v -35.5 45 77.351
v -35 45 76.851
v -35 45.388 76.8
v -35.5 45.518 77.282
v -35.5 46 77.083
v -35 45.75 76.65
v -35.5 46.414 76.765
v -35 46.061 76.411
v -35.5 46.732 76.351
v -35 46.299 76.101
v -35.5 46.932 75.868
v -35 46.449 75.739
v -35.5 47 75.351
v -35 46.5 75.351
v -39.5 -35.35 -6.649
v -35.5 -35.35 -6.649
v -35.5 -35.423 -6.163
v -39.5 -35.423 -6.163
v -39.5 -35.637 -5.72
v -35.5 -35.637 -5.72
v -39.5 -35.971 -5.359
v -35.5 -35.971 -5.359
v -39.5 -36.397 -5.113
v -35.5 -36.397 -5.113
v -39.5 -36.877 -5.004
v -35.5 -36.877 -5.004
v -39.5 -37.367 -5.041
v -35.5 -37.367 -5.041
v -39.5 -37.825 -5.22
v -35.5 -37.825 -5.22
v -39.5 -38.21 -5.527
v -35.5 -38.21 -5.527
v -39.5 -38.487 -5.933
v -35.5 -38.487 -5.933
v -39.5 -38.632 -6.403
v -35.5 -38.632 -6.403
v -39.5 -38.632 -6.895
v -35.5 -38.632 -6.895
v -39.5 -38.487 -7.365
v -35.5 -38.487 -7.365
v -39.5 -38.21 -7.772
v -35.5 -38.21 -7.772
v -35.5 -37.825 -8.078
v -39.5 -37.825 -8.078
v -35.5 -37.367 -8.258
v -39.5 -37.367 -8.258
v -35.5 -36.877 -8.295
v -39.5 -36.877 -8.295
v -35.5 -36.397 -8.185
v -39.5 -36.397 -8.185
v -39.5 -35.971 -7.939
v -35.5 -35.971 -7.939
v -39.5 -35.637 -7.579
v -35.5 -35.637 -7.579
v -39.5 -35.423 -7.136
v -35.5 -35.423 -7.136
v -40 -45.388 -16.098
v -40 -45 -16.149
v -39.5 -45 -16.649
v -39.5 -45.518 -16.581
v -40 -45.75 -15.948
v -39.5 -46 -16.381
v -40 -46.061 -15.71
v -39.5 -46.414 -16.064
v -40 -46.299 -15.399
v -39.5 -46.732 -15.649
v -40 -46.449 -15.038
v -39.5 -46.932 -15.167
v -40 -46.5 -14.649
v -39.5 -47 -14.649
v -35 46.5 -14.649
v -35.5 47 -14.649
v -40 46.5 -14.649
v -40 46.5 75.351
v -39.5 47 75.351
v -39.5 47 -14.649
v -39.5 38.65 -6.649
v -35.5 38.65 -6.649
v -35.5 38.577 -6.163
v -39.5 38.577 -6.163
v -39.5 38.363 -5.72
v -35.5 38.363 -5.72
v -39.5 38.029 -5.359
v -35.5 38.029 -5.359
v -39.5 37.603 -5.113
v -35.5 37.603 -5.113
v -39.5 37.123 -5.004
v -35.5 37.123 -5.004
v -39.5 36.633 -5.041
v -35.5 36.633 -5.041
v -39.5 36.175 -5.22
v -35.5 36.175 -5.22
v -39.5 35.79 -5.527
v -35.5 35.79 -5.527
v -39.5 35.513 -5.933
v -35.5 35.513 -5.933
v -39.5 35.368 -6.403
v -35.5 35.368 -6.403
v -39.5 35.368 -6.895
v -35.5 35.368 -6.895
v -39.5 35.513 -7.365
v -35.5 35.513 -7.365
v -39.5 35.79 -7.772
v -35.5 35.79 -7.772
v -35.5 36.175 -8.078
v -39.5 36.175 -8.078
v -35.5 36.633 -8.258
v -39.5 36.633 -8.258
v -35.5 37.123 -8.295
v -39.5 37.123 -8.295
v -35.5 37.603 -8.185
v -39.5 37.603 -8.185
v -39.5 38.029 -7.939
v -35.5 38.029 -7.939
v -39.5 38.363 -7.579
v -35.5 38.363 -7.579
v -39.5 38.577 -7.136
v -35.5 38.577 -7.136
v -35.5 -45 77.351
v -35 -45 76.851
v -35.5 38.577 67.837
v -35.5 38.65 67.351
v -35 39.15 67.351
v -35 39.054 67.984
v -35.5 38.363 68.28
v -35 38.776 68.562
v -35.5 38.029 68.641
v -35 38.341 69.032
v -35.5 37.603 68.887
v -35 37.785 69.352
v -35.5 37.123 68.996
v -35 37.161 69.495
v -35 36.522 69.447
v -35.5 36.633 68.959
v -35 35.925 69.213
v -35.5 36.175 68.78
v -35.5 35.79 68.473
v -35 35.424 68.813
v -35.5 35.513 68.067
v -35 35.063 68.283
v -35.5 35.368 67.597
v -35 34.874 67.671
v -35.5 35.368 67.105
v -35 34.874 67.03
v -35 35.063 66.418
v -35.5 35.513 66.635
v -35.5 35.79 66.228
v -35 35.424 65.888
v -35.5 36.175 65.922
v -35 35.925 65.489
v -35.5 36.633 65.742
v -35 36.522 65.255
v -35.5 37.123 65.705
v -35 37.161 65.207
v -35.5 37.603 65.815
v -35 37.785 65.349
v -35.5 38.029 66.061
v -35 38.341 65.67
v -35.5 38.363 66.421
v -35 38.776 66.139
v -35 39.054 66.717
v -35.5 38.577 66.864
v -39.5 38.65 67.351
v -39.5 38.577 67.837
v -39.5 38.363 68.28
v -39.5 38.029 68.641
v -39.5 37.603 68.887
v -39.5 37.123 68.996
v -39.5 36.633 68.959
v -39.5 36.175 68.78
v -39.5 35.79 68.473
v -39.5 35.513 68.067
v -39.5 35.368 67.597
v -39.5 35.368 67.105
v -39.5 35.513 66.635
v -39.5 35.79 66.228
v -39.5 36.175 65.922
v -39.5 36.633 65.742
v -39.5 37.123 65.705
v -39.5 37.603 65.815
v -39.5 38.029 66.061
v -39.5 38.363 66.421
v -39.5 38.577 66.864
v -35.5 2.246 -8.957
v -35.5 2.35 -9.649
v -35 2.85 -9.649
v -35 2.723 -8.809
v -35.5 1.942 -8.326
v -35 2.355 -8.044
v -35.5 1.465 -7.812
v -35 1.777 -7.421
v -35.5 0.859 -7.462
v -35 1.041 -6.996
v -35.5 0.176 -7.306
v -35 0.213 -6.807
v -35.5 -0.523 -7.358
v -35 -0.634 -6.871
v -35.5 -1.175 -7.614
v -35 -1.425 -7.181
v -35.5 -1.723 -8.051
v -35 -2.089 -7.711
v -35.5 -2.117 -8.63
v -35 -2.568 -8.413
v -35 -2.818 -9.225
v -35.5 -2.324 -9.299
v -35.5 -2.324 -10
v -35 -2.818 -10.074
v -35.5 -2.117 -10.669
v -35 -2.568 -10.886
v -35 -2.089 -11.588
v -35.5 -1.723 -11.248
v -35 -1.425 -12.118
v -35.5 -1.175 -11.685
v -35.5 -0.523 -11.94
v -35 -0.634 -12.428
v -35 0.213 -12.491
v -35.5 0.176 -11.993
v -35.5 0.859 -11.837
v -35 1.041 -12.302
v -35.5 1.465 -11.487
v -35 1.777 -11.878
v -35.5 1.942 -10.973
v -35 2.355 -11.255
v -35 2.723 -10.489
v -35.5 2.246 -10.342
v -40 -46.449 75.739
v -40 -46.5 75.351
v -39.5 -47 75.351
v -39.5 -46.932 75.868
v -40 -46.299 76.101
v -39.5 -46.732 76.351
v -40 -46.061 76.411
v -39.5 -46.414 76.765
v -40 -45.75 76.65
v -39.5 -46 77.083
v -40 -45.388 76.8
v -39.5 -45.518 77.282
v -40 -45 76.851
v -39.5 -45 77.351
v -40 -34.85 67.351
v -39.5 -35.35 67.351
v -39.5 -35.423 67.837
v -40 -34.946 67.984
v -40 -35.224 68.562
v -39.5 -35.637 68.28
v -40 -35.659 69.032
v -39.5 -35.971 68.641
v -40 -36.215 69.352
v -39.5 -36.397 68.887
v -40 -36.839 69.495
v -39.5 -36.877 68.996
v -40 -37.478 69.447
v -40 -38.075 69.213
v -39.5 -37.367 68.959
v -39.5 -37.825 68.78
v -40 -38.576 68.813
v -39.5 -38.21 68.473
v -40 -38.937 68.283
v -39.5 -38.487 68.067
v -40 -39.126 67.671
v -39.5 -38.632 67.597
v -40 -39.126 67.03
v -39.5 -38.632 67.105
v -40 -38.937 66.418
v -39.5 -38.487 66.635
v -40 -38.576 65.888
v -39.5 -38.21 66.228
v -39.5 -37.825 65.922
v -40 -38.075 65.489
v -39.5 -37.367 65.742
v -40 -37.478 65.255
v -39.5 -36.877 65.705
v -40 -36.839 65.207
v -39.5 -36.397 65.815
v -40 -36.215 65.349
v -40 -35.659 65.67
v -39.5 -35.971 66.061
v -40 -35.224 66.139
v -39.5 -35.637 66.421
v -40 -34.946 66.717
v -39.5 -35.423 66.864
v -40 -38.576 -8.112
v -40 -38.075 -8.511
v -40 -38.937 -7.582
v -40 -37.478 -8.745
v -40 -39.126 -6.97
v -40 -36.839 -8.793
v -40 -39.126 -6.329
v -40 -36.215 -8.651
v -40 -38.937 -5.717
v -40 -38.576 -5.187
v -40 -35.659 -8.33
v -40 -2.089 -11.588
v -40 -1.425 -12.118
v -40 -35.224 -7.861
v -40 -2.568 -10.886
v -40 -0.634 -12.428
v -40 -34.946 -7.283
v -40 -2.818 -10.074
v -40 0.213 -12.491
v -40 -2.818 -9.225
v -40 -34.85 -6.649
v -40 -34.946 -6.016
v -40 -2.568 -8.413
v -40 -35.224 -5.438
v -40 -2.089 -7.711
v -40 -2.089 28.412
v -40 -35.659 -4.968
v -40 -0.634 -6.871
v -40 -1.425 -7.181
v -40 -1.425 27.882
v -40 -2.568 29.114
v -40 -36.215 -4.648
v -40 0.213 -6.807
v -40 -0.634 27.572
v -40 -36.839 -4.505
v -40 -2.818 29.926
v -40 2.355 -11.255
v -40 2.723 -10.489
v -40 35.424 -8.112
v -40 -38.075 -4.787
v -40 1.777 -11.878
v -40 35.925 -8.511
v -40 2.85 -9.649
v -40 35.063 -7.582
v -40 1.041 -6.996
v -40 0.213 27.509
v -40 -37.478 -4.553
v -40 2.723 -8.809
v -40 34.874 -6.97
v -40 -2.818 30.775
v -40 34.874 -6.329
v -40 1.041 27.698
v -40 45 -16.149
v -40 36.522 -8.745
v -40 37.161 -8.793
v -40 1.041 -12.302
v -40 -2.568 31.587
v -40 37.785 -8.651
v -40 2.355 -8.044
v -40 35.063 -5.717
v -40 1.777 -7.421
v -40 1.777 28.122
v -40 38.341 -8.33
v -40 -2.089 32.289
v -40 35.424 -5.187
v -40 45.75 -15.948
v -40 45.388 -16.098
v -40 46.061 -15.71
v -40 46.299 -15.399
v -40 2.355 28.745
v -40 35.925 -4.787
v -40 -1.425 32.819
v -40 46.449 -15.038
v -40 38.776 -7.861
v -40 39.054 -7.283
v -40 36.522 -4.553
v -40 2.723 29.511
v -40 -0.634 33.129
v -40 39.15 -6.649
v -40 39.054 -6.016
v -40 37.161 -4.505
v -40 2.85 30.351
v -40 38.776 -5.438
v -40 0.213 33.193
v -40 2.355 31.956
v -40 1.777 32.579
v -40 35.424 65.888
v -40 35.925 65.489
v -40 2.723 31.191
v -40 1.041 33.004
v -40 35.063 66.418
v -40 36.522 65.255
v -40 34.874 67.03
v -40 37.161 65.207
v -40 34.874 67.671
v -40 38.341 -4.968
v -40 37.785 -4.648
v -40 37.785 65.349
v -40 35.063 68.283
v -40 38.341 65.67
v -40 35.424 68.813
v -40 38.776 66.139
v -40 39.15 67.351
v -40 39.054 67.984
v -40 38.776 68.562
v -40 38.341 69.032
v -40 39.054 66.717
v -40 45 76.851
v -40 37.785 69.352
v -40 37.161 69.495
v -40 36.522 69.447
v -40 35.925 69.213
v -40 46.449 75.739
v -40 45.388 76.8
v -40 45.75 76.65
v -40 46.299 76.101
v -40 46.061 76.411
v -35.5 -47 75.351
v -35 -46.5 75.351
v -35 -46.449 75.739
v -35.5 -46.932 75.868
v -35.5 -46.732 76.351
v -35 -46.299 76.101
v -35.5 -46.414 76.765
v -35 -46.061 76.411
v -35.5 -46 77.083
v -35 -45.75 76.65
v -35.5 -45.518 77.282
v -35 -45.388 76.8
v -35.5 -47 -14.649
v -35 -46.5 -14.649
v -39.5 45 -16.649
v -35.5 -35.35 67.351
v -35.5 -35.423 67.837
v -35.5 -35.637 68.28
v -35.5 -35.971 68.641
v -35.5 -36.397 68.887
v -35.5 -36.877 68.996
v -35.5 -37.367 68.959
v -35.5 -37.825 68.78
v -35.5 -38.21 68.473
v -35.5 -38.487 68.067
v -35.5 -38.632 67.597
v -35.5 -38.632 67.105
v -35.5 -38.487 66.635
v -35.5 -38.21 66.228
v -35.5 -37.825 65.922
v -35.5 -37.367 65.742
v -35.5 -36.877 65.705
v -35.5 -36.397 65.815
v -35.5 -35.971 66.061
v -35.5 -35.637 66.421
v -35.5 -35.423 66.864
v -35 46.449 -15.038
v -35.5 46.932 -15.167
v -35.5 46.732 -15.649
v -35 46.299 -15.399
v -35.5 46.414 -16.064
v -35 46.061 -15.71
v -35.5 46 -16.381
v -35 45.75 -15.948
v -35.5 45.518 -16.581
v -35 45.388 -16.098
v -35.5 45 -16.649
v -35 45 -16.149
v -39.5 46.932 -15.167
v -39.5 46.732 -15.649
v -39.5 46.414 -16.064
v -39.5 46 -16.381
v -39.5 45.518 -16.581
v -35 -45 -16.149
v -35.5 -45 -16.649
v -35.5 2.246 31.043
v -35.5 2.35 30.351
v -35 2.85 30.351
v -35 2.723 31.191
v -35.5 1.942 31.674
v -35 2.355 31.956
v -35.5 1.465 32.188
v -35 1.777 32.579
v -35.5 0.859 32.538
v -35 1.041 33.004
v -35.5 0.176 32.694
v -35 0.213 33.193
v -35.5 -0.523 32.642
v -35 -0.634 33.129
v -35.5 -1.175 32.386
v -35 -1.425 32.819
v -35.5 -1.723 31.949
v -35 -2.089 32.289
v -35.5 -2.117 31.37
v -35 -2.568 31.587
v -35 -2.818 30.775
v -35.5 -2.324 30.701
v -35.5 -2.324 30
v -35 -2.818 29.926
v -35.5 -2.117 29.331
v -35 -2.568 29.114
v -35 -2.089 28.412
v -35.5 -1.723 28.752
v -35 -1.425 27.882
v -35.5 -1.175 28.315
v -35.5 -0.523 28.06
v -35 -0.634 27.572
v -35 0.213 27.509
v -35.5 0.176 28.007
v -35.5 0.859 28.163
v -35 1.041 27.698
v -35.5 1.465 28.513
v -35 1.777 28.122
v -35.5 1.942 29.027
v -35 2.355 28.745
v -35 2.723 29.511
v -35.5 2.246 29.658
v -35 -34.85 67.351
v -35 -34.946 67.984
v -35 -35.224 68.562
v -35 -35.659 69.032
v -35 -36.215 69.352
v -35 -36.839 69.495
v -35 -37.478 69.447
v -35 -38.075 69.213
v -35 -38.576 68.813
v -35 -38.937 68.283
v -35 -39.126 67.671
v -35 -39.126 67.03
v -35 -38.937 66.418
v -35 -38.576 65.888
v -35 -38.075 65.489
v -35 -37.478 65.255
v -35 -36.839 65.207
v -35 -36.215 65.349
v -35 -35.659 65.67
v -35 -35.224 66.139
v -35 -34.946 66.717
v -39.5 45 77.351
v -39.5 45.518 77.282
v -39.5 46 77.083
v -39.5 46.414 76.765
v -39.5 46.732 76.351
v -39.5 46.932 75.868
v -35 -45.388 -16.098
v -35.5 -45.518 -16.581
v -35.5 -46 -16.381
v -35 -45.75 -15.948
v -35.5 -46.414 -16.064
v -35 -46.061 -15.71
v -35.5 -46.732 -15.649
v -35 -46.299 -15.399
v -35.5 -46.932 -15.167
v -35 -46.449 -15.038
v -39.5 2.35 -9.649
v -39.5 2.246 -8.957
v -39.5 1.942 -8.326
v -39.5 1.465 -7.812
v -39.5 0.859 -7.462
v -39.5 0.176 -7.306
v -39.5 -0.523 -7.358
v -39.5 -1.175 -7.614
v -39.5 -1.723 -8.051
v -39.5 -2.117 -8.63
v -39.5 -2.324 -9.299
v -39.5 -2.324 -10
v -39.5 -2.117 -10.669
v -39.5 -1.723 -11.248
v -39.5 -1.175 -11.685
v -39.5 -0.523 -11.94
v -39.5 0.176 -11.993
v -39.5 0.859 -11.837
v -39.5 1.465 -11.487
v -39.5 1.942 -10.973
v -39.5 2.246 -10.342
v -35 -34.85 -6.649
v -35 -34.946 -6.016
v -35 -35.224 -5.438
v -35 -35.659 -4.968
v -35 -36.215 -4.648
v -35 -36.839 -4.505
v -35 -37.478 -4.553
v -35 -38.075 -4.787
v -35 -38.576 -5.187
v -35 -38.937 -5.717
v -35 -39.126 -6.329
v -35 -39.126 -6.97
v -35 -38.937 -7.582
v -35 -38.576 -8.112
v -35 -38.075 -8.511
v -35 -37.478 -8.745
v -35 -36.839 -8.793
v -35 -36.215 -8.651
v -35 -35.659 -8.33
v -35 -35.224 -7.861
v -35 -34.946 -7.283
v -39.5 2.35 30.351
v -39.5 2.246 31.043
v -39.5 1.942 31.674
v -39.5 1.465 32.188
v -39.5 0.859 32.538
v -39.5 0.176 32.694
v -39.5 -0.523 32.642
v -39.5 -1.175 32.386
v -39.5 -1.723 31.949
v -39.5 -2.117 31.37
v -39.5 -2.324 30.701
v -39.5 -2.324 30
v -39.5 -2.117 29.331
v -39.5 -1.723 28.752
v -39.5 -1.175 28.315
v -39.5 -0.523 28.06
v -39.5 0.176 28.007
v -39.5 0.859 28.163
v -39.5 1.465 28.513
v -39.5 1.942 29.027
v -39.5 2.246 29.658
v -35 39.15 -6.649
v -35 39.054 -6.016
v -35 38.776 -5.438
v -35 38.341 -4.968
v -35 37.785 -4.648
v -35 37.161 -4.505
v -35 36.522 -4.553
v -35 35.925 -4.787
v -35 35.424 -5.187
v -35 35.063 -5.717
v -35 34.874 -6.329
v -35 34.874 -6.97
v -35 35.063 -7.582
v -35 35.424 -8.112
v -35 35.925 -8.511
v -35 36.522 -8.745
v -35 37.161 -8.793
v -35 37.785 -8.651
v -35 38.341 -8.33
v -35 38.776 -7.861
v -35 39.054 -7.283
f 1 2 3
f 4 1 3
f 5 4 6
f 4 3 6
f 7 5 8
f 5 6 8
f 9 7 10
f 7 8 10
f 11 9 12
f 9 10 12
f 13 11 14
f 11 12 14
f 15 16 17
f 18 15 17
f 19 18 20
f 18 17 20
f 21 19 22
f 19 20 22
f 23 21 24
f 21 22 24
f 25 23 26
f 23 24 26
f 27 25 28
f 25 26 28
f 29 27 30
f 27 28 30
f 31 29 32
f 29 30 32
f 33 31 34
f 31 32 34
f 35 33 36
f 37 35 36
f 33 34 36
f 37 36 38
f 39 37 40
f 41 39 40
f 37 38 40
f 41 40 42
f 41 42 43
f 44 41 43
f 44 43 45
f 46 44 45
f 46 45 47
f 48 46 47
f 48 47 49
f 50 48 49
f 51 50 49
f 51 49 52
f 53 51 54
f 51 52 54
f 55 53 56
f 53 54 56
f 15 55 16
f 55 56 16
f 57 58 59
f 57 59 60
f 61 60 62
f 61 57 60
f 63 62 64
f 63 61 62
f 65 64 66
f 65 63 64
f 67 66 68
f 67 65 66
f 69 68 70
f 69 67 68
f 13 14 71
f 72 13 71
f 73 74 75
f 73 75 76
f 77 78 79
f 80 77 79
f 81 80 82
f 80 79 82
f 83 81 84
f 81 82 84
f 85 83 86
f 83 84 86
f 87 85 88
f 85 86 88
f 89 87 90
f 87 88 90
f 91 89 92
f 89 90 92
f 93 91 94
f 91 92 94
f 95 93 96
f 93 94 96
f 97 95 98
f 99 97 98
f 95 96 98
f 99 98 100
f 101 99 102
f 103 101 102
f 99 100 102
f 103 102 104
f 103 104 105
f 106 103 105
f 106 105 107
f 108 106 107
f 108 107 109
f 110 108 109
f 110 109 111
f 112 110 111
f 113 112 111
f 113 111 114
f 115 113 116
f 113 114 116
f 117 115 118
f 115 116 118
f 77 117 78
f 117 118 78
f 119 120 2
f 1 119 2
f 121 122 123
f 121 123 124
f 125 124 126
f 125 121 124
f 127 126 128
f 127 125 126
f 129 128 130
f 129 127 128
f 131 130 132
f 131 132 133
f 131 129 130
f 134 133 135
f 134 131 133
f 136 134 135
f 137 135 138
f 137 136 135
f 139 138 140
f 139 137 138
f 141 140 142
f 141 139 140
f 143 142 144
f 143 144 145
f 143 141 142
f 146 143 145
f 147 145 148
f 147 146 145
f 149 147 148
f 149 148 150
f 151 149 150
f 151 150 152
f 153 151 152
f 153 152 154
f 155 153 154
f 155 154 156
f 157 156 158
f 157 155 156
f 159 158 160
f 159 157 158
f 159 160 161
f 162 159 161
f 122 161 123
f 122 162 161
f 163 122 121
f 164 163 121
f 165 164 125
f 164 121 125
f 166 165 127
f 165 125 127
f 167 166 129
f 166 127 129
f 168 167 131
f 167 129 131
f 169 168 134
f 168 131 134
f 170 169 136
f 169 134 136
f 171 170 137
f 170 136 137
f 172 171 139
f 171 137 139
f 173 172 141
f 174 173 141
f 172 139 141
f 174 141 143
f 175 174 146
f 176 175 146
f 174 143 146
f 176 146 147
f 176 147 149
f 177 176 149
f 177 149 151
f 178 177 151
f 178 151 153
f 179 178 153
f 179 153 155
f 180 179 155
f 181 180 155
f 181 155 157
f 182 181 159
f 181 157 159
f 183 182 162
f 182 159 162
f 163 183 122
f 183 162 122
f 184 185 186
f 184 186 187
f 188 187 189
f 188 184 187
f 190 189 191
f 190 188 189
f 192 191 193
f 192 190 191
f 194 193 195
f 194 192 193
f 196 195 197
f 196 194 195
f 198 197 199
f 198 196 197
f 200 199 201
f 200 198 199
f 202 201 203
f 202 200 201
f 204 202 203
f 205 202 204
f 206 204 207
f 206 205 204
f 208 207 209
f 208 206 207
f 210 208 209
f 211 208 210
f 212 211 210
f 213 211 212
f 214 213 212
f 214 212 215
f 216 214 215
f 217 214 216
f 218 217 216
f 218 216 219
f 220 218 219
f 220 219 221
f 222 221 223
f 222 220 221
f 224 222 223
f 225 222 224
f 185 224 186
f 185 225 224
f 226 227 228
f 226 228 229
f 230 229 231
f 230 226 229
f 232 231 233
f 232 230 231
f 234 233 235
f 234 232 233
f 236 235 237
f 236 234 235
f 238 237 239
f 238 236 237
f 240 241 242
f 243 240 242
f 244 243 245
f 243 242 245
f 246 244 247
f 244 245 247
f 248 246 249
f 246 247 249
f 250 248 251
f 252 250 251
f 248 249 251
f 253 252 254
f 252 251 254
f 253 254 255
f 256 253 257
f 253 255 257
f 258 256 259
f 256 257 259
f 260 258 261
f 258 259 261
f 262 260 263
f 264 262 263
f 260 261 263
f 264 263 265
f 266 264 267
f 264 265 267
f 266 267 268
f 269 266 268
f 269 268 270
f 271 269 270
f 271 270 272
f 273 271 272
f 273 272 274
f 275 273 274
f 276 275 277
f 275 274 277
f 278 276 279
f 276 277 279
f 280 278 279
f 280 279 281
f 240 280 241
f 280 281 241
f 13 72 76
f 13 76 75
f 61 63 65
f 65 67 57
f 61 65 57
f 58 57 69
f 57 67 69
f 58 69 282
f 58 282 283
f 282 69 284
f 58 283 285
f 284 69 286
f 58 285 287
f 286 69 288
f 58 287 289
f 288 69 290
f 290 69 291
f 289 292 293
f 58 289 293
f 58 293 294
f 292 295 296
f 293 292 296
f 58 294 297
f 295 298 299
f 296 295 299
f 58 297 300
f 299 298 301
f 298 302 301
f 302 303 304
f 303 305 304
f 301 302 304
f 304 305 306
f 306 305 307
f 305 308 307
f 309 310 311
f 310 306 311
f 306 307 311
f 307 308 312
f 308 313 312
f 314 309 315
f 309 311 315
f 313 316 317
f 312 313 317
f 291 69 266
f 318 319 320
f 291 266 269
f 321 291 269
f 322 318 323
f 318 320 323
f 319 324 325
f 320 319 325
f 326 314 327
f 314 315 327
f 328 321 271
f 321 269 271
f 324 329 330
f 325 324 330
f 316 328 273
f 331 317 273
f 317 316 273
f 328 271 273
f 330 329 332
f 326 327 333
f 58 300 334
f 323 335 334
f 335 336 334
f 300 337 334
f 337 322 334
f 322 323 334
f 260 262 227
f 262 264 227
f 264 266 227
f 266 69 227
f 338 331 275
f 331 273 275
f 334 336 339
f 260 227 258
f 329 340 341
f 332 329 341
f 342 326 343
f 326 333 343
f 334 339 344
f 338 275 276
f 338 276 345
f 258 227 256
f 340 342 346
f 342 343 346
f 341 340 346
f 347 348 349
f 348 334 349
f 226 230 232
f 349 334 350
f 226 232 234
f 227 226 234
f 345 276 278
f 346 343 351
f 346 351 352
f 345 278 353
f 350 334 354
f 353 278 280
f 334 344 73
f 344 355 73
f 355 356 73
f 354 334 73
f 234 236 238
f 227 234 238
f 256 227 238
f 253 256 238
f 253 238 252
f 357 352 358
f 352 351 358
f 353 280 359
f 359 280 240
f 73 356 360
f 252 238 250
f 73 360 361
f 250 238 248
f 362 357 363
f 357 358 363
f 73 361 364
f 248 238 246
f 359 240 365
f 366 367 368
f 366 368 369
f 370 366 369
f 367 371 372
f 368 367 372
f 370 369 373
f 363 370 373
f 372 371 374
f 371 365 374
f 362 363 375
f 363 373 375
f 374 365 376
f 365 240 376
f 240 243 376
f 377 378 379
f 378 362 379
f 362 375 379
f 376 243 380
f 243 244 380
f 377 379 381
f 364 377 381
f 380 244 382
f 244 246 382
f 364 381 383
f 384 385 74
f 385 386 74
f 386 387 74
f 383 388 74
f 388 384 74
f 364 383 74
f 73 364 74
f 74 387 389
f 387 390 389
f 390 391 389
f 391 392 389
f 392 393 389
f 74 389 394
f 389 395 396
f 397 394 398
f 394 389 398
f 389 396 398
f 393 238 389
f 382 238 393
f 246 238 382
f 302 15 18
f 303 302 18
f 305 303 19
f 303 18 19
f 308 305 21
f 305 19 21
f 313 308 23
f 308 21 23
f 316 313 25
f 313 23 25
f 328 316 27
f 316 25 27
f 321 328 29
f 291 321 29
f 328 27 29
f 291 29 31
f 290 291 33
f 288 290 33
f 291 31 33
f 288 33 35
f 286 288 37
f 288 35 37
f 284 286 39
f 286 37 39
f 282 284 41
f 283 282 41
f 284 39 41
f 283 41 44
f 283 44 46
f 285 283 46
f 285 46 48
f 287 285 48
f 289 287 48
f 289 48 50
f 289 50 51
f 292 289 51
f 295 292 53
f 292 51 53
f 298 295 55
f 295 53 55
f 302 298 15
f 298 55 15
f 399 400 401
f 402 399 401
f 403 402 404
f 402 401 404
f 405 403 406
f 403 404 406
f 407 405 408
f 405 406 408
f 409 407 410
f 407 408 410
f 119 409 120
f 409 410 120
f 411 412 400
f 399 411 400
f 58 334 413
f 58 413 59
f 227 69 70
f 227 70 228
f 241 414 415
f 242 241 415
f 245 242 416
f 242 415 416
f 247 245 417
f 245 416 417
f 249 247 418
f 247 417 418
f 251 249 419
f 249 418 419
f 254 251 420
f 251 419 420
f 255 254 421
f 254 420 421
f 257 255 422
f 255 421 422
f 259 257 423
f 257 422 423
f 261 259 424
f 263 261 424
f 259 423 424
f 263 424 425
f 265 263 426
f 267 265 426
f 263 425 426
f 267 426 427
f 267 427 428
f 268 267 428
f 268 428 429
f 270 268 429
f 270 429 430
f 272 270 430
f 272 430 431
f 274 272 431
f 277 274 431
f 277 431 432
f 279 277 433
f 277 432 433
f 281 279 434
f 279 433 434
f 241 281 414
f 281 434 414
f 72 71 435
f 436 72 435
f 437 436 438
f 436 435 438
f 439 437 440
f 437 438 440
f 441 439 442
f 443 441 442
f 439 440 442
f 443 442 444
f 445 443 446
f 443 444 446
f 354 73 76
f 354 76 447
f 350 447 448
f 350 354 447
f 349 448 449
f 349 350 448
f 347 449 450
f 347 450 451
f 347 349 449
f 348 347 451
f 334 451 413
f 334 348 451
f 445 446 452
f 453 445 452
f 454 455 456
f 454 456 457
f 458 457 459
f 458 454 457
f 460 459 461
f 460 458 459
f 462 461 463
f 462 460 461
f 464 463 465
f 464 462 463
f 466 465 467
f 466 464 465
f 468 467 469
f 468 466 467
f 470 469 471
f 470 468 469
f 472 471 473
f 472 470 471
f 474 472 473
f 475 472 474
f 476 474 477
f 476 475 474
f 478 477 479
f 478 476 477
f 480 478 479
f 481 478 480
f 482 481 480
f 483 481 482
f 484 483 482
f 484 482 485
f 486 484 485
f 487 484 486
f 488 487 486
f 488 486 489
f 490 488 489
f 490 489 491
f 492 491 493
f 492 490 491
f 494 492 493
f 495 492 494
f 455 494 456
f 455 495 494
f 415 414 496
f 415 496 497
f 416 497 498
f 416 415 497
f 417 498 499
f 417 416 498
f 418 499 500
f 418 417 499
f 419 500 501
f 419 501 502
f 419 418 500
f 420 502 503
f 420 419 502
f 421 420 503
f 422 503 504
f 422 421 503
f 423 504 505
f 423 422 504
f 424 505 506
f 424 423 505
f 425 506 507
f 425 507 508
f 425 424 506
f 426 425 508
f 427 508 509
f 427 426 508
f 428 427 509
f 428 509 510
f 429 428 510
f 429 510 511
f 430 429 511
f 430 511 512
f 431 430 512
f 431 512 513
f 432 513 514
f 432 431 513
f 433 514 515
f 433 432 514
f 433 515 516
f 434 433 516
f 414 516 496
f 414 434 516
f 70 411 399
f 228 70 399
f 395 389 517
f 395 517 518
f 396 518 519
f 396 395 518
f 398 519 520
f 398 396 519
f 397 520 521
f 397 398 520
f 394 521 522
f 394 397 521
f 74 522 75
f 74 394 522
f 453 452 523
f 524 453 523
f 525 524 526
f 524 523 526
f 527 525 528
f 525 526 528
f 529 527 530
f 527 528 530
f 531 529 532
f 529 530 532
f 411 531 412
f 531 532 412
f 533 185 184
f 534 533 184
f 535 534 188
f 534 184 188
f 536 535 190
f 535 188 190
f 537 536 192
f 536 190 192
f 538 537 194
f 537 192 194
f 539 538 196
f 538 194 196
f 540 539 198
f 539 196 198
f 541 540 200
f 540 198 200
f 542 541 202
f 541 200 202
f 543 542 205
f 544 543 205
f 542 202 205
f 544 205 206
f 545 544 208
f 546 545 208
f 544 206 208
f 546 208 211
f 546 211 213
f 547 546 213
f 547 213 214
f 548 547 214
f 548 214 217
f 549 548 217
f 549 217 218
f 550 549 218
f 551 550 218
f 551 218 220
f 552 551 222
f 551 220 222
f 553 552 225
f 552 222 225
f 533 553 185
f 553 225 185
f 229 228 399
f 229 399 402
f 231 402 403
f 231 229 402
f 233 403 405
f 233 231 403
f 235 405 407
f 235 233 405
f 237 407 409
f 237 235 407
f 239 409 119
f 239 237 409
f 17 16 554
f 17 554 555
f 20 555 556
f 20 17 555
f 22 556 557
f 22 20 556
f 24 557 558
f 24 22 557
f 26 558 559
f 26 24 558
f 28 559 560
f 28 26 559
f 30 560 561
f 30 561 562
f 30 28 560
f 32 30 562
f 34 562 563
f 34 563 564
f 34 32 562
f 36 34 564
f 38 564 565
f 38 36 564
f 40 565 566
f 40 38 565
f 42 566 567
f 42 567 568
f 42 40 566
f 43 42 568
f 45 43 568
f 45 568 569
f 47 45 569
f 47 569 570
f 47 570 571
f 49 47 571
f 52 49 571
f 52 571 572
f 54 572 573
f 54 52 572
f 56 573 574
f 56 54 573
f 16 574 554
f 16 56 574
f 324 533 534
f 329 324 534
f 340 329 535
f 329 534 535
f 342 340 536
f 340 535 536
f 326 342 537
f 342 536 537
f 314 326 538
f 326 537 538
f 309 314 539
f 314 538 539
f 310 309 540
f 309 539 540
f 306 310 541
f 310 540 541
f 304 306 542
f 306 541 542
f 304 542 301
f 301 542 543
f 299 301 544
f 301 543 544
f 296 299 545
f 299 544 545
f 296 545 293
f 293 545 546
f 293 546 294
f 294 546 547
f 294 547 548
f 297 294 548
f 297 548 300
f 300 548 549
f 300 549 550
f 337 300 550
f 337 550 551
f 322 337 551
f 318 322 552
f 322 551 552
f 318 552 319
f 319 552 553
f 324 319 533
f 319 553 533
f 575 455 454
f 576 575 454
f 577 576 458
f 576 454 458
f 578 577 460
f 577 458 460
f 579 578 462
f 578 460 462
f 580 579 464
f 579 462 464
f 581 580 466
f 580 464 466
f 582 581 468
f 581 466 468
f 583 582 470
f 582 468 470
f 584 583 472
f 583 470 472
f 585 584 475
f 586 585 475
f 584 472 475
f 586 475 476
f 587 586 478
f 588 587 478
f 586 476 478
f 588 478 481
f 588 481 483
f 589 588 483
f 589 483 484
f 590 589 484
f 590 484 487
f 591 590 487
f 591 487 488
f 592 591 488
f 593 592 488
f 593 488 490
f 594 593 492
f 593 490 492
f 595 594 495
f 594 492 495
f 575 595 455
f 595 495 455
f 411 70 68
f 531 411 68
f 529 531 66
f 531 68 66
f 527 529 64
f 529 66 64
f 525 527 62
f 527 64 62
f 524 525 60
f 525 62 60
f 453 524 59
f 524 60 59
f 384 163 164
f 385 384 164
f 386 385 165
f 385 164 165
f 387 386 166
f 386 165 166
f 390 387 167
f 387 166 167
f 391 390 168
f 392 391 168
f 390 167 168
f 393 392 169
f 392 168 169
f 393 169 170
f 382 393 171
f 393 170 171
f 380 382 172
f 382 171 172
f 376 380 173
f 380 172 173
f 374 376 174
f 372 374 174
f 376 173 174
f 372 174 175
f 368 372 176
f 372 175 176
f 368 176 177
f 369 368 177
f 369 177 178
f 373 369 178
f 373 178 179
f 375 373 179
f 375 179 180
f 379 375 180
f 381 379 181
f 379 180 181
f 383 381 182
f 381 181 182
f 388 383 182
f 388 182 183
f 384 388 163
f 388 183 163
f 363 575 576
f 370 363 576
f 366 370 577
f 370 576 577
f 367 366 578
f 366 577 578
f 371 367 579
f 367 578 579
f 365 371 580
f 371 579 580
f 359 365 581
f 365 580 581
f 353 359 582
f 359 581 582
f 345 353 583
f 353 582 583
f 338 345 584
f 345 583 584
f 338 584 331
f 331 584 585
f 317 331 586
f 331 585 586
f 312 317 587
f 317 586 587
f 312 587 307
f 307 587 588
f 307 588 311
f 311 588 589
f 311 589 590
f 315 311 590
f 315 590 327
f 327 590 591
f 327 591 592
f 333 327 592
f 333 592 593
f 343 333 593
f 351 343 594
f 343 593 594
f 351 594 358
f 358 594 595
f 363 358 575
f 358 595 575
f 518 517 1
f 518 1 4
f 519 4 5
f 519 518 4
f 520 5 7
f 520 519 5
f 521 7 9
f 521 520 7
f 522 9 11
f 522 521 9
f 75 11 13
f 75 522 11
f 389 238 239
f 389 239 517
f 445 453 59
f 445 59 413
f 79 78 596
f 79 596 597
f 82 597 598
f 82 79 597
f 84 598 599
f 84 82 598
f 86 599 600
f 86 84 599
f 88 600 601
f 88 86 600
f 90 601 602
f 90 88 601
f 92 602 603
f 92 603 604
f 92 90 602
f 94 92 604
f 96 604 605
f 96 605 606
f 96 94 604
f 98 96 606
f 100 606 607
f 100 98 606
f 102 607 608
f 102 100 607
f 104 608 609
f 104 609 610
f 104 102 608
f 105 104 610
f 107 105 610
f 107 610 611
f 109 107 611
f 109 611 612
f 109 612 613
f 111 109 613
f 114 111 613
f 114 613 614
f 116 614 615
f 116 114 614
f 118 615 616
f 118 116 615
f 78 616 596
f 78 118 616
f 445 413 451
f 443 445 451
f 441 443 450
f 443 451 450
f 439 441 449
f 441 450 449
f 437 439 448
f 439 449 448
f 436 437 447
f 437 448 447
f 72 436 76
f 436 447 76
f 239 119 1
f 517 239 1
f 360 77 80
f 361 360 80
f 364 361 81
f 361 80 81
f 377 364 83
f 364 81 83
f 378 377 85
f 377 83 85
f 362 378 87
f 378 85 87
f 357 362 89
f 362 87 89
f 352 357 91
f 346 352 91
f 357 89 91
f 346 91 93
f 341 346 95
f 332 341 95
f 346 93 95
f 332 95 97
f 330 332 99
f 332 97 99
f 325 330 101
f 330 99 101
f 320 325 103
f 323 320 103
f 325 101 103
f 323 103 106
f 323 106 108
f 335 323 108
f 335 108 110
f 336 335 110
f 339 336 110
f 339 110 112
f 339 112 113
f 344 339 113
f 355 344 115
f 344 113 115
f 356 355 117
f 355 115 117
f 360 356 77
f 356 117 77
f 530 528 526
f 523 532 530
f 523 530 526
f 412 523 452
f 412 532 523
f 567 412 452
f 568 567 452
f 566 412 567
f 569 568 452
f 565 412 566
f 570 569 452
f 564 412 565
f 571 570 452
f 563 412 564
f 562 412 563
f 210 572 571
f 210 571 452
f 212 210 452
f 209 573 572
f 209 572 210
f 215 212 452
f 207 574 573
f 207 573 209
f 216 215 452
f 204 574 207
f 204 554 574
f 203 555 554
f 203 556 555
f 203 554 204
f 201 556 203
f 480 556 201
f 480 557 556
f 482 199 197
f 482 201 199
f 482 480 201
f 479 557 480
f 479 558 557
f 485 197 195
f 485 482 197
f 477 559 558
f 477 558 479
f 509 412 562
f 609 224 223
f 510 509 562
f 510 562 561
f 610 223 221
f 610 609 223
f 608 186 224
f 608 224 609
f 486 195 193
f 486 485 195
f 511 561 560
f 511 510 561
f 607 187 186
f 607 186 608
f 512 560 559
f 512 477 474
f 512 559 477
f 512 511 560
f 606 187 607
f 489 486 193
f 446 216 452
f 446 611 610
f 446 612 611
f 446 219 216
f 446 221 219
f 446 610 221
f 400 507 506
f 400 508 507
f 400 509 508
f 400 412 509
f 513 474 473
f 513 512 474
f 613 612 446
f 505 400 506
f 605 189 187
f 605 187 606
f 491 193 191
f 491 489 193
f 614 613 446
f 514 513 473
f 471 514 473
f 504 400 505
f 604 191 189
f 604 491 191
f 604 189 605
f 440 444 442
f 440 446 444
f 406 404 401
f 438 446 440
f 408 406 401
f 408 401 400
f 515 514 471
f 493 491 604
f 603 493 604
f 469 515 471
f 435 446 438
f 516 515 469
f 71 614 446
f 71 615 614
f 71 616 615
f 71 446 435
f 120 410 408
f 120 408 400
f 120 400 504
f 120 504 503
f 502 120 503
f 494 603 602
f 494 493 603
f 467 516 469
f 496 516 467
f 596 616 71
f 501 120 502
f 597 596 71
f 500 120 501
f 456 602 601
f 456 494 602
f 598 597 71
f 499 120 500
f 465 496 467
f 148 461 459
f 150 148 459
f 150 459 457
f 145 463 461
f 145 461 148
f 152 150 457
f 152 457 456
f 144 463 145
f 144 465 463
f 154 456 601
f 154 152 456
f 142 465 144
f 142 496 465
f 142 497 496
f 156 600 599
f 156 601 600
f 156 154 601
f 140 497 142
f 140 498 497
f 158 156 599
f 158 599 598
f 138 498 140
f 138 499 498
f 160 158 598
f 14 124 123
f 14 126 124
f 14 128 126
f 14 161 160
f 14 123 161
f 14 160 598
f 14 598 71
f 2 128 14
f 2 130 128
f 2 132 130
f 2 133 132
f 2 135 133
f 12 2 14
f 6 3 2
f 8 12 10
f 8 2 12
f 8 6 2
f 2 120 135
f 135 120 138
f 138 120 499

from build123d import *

# Parameters (mm, degrees)
SKETCH019_W     = 94
SKETCH019_H     = 94
SKETCH019_R     = 2.35
SKETCH019_R_2   = 1.65
PAD008_DEPTH    = 5
FILLET003_R     = 2
CHAMFER005_SIZE = 0.5
CHAMFER006_SIZE = 0.5


with BuildPart() as part:
    # Sketch019 → Pad008 (new body)
    with BuildSketch(Plane.YZ.offset(-35)):
        with Locations((0, 30.3506240158)):
            Rectangle(SKETCH019_W, SKETCH019_H)
        with Locations((0, 30.3506240158)):
            Circle(SKETCH019_R, mode=Mode.SUBTRACT)
        with Locations((-37, 67.3506240158)):
            Circle(SKETCH019_R_2, mode=Mode.SUBTRACT)
        with Locations((37, 67.3506240158)):
            Circle(SKETCH019_R_2, mode=Mode.SUBTRACT)
        with Locations((-37, -6.6493759842)):
            Circle(SKETCH019_R_2, mode=Mode.SUBTRACT)
        with Locations((37, -6.6493759842)):
            Circle(SKETCH019_R_2, mode=Mode.SUBTRACT)
        with Locations((0, -9.6493759842)):
            Circle(SKETCH019_R, mode=Mode.SUBTRACT)
    extrude(amount=-PAD008_DEPTH)

    # Fillet003
    fillet003_edges = [part.edges().sort_by_distance(p)[0] for p in [
        (-37.5, -47, -16.649376),
        (-37.5, -47, 77.350624),
        (-37.5, 47, 77.350624),
        (-37.5, 47, -16.649376),
    ]]
    fillet(fillet003_edges, radius=FILLET003_R)

    # Chamfer005
    chamfer005_edges = [part.edges().sort_by_distance(p)[0] for p in [
        (-35, -47, 30.350624),
        (-35, -46.414214, 76.764838),
        (-35, -46.414214, -16.06359),
        (-35, 0, 77.350624),
        (-35, 0, -16.649376),
        (-35, 46.414214, 76.764838),
        (-35, 46.414214, -16.06359),
        (-35, 47, 30.350624),
        (-35, -2.35, -9.649376),
        (-35, -2.35, 30.350624),
        (-35, 35.35, 67.350624),
        (-35, -38.65, 67.350624),
        (-35, 35.35, -6.649376),
        (-35, -38.65, -6.649376),
    ]]
    chamfer(chamfer005_edges, length=CHAMFER005_SIZE)

    # Chamfer006
    chamfer006_edges = [part.edges().sort_by_distance(p)[0] for p in [
        (-40, -47, 30.350624),
        (-40, -46.414214, 76.764838),
        (-40, -46.414214, -16.06359),
        (-40, 0, 77.350624),
        (-40, 0, -16.649376),
        (-40, 46.414214, 76.764838),
        (-40, 46.414214, -16.06359),
        (-40, 47, 30.350624),
        (-40, -2.35, -9.649376),
        (-40, -2.35, 30.350624),
        (-40, 35.35, 67.350624),
        (-40, -38.65, 67.350624),
        (-40, 35.35, -6.649376),
        (-40, -38.65, -6.649376),
    ]]
    chamfer(chamfer006_edges, length=CHAMFER006_SIZE)


solid = part.part
